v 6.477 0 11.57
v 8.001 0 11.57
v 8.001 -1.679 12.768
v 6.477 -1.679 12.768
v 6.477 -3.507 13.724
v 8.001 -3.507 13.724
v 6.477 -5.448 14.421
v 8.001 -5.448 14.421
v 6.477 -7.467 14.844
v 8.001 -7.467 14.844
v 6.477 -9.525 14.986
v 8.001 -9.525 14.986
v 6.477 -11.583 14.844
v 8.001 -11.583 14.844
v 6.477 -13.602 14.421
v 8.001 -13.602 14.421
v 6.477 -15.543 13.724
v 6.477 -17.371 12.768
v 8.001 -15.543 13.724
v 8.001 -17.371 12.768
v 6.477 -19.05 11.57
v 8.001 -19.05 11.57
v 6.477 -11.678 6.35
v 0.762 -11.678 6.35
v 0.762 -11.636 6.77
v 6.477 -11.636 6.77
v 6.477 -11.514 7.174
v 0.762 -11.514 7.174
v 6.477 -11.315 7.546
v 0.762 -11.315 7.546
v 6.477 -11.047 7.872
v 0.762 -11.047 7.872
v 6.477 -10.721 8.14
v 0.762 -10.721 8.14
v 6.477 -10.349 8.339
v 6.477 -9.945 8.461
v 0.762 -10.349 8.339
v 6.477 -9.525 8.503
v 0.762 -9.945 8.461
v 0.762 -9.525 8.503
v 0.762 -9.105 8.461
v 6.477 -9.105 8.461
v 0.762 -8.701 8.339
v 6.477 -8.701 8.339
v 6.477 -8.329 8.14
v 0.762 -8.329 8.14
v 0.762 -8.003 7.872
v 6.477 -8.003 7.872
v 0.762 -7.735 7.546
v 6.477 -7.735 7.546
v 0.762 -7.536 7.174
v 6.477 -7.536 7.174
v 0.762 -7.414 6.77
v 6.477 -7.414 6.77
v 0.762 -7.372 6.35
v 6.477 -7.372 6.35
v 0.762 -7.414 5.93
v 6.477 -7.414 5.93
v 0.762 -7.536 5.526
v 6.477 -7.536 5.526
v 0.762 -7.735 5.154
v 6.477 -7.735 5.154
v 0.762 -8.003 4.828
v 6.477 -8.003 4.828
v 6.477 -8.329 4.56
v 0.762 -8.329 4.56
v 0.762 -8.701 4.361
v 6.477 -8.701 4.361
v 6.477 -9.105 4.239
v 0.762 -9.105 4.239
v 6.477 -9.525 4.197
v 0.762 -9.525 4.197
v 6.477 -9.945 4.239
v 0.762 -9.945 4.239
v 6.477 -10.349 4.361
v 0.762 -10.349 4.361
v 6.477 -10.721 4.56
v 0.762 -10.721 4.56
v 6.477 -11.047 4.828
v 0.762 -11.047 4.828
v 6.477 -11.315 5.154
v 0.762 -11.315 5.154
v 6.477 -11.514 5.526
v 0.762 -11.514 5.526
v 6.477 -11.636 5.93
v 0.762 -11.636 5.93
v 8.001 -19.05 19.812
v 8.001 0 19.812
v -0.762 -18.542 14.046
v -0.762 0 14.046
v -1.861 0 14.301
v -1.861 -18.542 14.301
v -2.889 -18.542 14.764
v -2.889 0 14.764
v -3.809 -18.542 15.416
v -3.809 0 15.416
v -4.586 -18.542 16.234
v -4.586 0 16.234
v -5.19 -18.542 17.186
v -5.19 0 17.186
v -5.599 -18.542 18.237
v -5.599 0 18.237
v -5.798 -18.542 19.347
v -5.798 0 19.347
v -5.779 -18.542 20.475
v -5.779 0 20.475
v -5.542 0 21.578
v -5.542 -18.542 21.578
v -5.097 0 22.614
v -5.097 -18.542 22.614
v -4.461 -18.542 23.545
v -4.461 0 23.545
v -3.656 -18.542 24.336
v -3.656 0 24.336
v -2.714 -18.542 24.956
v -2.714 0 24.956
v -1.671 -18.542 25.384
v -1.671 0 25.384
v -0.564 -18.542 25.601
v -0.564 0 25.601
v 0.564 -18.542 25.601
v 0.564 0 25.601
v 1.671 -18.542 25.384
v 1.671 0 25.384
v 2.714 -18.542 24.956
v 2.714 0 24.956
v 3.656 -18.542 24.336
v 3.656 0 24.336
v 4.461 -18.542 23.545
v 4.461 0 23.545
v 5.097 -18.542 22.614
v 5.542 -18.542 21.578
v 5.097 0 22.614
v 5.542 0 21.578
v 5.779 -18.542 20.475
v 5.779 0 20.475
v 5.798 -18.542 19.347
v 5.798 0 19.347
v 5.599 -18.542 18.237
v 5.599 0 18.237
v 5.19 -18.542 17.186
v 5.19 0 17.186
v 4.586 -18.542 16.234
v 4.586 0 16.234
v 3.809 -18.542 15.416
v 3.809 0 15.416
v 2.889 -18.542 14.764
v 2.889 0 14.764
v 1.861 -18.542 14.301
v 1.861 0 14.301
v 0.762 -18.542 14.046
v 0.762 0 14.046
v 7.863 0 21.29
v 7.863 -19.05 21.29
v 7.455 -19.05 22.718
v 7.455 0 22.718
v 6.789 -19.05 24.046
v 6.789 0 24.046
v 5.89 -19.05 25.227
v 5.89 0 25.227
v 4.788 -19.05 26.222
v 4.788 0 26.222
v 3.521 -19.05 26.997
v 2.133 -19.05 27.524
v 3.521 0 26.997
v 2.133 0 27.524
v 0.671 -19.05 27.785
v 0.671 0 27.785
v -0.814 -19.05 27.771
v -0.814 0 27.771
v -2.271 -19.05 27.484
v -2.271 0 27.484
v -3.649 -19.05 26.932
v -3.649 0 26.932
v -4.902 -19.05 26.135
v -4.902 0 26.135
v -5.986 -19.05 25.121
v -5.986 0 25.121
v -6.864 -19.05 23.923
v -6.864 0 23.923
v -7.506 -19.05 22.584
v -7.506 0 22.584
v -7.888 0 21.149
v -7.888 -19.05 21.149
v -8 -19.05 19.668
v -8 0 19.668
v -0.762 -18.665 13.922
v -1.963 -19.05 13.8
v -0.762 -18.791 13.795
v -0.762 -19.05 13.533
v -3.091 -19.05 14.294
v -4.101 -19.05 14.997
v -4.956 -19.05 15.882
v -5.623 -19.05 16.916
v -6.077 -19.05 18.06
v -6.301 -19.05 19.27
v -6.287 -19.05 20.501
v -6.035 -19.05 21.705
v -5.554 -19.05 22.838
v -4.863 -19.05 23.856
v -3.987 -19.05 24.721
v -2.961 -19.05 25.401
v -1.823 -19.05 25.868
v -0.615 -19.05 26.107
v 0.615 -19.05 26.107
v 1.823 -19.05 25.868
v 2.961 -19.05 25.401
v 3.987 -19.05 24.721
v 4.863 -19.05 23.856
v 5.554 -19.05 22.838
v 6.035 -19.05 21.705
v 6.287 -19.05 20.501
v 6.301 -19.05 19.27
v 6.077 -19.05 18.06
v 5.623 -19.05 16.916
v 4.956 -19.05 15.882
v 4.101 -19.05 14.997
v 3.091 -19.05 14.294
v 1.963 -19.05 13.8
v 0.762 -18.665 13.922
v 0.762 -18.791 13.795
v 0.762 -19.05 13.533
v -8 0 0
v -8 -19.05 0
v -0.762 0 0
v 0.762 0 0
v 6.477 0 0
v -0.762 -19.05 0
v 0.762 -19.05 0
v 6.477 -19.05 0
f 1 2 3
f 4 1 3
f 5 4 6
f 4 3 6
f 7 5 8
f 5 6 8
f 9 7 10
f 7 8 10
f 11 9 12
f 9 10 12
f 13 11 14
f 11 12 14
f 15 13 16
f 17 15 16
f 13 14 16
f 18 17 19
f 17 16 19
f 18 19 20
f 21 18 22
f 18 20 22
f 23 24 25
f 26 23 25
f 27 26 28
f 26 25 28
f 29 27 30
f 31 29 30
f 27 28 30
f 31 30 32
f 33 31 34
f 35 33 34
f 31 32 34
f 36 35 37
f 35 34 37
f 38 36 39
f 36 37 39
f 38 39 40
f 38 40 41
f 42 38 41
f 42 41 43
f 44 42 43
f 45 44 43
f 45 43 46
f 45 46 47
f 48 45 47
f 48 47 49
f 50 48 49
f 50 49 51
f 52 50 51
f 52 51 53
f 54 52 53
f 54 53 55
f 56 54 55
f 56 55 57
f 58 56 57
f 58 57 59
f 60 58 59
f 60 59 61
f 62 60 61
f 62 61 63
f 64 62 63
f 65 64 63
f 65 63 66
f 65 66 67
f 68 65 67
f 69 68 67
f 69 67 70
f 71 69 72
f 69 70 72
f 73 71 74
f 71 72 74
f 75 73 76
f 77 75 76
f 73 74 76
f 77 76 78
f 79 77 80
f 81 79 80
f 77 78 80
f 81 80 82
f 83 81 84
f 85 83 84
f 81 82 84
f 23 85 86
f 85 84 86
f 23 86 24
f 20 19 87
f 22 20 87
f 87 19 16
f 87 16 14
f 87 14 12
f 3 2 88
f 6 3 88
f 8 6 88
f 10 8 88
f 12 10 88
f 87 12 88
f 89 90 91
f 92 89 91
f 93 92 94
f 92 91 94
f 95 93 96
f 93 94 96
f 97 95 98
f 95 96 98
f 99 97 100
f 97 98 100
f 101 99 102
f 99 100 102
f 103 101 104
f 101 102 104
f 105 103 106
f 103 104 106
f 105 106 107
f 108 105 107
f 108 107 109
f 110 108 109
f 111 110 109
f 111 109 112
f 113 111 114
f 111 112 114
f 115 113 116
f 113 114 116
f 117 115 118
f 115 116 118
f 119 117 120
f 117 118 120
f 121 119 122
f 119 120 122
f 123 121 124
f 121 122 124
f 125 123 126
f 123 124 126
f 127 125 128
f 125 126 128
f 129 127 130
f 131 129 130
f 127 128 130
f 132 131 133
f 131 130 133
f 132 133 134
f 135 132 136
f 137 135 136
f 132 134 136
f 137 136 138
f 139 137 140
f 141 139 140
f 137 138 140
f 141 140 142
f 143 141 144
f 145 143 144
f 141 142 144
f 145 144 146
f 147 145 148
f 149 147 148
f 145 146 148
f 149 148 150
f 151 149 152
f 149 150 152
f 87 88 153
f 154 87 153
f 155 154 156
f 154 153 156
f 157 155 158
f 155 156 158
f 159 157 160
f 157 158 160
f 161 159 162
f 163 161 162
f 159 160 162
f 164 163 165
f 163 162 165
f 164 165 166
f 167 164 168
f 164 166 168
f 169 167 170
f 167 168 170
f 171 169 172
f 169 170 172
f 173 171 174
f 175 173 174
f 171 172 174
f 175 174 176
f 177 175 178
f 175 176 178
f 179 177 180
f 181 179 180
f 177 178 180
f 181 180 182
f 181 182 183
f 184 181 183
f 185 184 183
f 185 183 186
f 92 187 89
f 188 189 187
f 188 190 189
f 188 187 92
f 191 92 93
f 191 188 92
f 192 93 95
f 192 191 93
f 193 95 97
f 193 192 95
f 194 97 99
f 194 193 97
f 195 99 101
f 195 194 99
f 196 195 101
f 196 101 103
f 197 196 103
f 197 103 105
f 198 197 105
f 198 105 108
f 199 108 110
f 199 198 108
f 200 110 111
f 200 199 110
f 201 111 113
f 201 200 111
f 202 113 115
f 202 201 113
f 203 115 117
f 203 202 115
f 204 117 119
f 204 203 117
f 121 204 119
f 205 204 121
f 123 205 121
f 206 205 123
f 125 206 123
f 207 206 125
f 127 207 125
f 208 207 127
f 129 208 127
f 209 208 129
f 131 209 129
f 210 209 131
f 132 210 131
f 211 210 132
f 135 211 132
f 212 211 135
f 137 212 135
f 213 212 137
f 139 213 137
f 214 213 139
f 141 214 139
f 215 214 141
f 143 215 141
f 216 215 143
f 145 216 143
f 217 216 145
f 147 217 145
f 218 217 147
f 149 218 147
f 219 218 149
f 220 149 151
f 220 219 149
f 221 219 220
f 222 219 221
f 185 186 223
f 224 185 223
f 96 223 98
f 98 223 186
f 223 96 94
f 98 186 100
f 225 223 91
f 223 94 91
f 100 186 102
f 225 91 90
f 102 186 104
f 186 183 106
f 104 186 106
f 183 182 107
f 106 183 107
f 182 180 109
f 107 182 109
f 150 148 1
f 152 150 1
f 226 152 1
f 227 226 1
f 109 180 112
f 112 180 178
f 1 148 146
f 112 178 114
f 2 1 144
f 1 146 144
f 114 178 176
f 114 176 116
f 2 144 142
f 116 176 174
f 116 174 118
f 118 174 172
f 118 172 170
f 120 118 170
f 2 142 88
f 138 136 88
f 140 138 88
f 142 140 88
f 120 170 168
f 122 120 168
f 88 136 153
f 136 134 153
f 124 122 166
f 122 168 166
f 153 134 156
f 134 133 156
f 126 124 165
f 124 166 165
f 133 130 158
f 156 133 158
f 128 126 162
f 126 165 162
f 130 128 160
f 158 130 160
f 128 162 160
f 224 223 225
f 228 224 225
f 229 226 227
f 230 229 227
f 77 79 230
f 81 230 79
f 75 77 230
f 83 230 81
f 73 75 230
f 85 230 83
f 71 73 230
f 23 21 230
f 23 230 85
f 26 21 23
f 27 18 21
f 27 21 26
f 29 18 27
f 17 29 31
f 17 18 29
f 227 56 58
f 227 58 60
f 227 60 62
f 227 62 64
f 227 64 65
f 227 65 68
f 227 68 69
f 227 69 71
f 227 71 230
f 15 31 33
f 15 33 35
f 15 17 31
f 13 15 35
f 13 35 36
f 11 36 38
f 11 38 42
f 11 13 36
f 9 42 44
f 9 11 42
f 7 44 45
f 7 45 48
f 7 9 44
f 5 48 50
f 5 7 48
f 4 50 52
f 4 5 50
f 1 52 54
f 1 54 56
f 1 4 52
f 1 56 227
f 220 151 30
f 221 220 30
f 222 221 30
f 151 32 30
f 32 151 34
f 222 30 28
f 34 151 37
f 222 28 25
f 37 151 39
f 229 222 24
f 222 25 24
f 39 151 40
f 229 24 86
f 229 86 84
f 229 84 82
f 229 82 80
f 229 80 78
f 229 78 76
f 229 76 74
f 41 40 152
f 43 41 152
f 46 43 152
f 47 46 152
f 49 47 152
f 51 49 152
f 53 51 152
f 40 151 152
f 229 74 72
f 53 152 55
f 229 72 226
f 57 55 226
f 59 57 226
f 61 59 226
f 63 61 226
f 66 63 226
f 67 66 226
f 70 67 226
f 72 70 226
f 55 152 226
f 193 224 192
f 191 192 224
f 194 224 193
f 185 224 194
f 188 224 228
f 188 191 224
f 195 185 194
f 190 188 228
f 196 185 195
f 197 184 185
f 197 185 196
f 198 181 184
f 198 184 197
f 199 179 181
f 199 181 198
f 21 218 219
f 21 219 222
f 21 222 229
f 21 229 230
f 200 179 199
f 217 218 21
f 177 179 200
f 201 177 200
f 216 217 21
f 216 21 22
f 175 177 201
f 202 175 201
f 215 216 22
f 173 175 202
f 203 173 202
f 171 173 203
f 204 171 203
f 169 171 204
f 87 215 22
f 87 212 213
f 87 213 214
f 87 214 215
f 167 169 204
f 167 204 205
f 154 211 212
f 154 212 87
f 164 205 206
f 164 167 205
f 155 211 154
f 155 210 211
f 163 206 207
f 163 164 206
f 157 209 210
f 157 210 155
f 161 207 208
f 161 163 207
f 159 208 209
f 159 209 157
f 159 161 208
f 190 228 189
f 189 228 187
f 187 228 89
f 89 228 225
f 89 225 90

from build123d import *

# Parameters (mm, degrees)
F1_DEPTH = 19.05
F2_SIZE  = 0.508
F4_DEPTH = 1.524
F6_D     = 4.3053
F6_DEPTH = 5.842
F6_TIP   = 1.2934426115


with BuildPart() as f1:
    # F0 (on Front) → F1 (new body)
    with BuildSketch(Plane.XZ):
        with BuildLine():
            Line((8.001, 0), (8.001, 19.812))
            ThreePointArc((8.001, 19.812), (-0.0717867798, 27.8126779499), (-7.9997118256, 19.6684322195))
            Line((-7.9997118256, 19.6684322195), (-7.9997118256, 0))
            Line((-7.9997118256, 0), (-0.762, 0))
            Line((-0.762, 0), (-0.762, 14.0455286734))
            ThreePointArc((-0.762, 14.0455286734), (0, 25.6286), (0.762, 14.0455286734))
            Line((0.762, 14.0455286734), (0.762, 0))
            Line((0.762, 0), (8.001, 0))
        make_face()
    extrude(amount=F1_DEPTH)

    # F2
    f2_edges = [f1.edges().sort_by_distance(p)[0] for p in [
        (0, -19.05, 25.6286),
    ]]
    chamfer(f2_edges, length=F2_SIZE)

    # F3 (on face) → F4 (cut)
    with BuildSketch(Plane.YZ.offset(8.001)):
        with BuildLine():
            Line((0, 0), (0, 11.5695536215))
            ThreePointArc((0, 11.5695536215), (-9.525, 14.986), (-19.05, 11.5695536215))
            Line((-19.05, 11.5695536215), (-19.05, 0))
            Line((-19.05, 0), (0, 0))
        make_face()
    extrude(amount=-F4_DEPTH, mode=Mode.SUBTRACT)

    # F6
    with Locations(Plane.YZ.offset(6.477)):
        with Locations((-9.525, 6.35)):
            Hole(F6_D / 2, depth=F6_DEPTH)
            with Locations((0, 0, -(F6_DEPTH + F6_TIP / 2))):  # 118° drill point
                Cone(0, F6_D / 2, F6_TIP, mode=Mode.SUBTRACT)


solid = f1.part
